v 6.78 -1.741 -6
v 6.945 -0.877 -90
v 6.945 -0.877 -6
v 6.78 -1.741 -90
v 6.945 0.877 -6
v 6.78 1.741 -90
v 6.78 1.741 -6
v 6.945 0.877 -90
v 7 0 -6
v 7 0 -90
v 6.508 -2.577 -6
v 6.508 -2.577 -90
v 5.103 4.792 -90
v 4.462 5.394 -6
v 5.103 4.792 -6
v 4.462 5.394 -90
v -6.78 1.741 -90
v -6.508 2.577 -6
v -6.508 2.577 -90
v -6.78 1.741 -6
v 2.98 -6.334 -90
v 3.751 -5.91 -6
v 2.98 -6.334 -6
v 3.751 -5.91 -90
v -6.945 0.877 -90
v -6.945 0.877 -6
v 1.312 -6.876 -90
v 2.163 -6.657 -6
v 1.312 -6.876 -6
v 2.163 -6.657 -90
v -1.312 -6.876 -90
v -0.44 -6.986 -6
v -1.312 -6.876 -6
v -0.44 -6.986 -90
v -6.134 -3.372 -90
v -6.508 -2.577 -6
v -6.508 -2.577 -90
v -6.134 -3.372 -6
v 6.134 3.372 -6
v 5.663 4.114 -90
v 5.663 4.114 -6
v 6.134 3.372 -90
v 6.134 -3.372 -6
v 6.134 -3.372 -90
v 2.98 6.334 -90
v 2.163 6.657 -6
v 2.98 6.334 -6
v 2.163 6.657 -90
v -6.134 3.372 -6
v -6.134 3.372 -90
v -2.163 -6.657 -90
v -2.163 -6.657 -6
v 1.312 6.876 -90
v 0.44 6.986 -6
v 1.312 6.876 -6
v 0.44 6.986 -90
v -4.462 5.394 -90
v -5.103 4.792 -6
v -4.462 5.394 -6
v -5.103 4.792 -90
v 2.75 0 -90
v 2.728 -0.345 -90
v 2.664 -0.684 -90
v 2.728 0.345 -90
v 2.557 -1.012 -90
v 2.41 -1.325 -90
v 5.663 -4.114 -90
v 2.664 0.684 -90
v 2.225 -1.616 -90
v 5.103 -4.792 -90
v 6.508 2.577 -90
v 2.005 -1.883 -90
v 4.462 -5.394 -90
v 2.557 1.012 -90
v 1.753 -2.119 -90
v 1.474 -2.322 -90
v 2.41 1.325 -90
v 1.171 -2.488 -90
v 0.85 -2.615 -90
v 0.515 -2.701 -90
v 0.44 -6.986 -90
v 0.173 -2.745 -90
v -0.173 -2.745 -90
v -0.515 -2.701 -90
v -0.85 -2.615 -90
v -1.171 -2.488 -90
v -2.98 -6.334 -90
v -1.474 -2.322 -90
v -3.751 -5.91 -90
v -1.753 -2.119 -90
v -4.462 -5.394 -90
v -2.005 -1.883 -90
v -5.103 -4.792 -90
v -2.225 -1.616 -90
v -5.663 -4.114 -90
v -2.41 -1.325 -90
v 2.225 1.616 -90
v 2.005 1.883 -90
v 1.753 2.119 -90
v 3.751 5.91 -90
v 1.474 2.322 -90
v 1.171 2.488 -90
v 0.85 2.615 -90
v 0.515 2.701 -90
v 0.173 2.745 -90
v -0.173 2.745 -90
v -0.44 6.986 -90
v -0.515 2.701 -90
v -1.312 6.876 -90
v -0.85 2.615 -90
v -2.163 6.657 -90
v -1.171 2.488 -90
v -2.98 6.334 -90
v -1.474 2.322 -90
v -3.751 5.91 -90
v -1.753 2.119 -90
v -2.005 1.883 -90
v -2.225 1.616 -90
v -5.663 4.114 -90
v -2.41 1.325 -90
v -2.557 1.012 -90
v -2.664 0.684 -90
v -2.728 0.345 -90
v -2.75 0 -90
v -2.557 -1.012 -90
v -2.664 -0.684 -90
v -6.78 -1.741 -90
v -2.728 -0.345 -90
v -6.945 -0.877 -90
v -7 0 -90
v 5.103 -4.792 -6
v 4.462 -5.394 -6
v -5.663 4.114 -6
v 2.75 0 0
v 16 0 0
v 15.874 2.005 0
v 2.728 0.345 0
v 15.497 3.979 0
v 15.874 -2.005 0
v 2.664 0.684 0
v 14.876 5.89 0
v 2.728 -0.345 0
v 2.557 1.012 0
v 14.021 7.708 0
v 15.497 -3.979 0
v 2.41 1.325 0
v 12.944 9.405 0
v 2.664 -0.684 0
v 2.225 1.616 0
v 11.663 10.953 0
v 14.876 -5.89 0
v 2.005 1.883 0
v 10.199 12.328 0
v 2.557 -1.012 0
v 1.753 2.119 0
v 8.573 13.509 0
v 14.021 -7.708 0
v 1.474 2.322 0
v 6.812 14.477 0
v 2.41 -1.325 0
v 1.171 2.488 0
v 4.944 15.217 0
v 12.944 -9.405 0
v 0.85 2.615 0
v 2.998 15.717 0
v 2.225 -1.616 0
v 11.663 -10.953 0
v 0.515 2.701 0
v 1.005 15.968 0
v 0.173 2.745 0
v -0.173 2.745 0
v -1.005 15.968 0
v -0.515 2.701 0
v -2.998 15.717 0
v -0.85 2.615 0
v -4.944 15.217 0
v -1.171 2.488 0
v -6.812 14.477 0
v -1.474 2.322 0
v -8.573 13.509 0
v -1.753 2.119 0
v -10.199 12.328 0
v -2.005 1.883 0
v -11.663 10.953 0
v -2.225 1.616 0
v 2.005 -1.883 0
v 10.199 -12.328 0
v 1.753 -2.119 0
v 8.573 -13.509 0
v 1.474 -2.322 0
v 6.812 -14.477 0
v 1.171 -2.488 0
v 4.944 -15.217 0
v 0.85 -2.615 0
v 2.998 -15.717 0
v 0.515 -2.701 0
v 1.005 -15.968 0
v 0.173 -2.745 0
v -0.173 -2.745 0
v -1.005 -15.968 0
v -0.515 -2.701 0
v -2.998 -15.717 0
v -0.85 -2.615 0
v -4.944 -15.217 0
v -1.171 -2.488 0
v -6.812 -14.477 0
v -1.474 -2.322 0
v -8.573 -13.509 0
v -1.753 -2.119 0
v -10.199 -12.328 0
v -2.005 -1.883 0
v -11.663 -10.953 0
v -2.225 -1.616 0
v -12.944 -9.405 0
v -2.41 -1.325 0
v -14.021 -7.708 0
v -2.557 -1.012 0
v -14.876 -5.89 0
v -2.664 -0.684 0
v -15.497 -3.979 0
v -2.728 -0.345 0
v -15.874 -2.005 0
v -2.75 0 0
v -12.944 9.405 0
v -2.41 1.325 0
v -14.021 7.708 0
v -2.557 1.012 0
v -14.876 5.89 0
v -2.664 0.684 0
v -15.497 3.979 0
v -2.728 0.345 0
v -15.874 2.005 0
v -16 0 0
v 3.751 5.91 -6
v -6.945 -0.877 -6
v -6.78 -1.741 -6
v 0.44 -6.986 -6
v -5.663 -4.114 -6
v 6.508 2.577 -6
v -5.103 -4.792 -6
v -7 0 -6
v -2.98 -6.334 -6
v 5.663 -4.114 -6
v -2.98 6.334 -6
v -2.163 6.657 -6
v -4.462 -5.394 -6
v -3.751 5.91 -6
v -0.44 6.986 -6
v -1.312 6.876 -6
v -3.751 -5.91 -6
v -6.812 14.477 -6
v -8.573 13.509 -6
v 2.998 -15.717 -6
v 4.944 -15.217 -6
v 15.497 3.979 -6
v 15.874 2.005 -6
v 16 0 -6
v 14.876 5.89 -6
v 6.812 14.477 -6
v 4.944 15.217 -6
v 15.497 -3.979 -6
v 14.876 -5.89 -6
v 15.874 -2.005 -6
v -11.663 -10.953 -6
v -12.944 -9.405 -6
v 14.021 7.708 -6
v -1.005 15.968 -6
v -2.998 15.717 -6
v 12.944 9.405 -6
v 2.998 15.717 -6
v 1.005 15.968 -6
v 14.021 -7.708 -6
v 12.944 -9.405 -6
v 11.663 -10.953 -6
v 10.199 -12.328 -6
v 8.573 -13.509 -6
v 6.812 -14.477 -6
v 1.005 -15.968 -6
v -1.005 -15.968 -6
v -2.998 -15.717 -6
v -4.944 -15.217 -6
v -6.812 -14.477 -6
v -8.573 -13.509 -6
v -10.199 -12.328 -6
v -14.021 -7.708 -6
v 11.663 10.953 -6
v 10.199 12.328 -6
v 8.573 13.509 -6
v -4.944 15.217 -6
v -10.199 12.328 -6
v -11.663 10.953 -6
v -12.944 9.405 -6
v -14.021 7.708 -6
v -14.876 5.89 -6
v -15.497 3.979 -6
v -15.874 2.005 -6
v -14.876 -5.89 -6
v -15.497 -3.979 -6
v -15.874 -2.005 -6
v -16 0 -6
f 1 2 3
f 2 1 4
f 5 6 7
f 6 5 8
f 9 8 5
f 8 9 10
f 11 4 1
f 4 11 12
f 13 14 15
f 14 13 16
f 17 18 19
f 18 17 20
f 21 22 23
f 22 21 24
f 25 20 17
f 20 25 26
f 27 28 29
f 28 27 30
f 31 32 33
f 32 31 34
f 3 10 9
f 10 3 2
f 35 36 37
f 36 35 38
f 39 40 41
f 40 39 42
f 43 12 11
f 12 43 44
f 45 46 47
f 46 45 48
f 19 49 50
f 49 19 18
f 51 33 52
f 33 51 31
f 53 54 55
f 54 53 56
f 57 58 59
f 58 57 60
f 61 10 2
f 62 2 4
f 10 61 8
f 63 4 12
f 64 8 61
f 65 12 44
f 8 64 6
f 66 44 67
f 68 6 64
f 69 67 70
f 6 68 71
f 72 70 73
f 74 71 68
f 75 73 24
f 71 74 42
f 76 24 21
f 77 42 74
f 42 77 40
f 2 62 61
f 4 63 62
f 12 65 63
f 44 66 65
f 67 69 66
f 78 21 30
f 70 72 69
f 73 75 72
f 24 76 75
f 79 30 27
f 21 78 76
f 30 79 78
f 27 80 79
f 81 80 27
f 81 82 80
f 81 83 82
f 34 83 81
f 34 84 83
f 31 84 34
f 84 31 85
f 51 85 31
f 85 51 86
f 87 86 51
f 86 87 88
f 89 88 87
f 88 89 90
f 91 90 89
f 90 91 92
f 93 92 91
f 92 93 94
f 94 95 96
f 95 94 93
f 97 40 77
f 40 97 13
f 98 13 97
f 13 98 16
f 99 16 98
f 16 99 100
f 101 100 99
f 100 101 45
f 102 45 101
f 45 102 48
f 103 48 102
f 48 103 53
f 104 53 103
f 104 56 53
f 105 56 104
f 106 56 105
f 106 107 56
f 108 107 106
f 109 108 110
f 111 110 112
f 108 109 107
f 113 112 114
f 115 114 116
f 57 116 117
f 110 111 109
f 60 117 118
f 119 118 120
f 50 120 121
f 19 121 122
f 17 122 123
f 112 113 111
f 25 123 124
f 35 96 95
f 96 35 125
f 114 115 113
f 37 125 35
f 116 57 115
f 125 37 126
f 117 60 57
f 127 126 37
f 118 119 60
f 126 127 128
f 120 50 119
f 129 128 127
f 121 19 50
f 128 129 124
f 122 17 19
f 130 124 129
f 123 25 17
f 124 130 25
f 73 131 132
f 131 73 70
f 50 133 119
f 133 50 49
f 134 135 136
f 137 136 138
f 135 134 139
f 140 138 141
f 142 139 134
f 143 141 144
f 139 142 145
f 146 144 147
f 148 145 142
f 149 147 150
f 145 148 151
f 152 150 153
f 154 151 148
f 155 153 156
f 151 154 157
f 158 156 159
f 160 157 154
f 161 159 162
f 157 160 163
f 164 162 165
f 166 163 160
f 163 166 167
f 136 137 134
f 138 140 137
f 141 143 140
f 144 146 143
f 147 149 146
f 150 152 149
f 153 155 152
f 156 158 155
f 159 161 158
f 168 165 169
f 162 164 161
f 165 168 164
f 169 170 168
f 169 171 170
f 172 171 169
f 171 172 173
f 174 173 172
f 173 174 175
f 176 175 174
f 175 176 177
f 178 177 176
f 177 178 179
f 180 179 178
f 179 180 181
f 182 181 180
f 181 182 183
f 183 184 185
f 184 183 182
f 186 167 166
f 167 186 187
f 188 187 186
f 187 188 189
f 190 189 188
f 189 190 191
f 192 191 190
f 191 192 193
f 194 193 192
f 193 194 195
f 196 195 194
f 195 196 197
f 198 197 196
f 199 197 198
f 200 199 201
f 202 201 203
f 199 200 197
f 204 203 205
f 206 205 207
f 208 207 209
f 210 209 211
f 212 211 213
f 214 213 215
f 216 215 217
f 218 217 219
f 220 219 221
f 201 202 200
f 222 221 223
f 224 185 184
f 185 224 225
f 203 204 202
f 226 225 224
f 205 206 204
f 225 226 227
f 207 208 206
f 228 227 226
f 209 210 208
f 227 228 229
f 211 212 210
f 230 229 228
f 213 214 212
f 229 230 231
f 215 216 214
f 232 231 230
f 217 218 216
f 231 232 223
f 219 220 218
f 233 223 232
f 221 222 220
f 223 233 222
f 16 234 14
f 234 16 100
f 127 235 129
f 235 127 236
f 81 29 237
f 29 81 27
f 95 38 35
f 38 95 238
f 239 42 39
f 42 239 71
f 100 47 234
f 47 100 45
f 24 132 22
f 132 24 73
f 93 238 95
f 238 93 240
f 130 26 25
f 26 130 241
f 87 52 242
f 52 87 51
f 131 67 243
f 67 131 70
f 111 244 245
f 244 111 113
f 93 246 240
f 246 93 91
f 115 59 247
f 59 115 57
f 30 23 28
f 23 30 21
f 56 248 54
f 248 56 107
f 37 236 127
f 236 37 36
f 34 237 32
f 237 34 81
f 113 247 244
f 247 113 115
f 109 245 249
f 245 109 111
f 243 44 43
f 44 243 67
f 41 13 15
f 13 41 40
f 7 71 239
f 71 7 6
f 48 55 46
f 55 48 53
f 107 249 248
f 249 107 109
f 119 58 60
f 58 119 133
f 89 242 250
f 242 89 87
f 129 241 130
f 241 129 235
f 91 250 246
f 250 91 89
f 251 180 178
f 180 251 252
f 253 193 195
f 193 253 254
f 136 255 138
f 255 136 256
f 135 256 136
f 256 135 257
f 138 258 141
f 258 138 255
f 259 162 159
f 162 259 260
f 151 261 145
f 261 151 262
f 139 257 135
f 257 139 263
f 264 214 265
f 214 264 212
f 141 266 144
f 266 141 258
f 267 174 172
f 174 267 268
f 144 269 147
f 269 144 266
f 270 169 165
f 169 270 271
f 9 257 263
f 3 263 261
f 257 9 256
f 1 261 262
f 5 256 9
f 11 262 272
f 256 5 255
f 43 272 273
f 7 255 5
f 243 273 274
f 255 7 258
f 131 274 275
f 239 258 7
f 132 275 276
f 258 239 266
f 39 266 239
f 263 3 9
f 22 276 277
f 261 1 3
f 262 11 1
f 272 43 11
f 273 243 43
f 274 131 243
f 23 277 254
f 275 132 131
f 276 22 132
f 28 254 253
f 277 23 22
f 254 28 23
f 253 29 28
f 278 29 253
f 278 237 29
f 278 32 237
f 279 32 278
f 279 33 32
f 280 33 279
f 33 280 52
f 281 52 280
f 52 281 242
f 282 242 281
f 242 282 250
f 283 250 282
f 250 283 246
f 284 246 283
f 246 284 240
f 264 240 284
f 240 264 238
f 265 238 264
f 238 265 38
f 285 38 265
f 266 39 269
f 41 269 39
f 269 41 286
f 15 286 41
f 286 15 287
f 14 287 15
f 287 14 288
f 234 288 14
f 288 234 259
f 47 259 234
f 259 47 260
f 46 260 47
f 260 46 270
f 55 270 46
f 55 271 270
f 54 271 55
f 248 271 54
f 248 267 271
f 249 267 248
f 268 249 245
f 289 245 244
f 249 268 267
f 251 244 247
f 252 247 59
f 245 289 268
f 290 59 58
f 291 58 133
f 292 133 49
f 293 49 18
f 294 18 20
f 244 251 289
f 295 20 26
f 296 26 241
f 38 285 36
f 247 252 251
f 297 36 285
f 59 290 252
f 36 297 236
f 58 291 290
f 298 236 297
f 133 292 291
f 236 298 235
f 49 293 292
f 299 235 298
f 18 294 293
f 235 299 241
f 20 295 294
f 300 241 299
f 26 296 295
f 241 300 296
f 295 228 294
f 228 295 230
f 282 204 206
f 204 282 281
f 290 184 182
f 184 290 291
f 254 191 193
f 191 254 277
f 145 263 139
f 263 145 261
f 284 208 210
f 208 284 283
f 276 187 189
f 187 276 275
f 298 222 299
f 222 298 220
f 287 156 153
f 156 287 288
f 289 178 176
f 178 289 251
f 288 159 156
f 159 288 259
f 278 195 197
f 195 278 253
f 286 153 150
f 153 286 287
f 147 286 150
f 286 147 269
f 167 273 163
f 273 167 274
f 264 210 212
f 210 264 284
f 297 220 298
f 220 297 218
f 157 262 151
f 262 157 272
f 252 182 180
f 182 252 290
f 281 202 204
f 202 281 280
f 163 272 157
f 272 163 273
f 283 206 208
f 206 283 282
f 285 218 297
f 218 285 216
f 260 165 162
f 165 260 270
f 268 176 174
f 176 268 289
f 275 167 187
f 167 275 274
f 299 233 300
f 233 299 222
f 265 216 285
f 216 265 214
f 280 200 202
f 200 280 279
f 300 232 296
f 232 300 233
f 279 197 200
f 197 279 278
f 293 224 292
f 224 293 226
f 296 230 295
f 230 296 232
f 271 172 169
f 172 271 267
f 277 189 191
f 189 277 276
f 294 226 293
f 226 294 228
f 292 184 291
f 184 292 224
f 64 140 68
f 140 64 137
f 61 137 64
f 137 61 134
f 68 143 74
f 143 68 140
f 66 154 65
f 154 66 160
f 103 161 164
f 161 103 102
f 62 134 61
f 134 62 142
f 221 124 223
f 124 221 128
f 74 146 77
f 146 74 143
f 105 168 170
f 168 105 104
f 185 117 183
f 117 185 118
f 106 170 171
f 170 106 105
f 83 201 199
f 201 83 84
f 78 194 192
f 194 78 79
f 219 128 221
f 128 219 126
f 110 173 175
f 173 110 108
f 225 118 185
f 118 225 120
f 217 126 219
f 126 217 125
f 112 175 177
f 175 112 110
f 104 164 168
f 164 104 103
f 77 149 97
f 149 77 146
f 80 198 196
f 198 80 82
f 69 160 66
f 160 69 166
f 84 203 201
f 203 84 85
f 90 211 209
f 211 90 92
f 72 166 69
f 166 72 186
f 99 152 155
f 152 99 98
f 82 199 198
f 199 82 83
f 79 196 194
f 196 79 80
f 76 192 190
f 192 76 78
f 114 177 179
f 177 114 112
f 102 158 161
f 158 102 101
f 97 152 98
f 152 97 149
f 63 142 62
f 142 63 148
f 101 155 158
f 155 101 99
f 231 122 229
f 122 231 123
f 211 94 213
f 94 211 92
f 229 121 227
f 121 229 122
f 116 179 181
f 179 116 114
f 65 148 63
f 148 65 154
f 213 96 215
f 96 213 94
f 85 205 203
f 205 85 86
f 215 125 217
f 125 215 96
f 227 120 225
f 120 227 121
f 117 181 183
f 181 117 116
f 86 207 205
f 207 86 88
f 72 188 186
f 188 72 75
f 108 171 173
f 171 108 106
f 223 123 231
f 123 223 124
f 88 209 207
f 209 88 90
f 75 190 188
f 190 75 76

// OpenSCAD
$fn = 50;


difference() {
	union() {
		translate(v = [0, 0, -90.0000000000]) {
			cylinder(h = 90, r = 7.0000000000);
		}
		translate(v = [0, 0, -6.0000000000]) {
			cylinder(h = 6, r = 16.0000000000);
		}
	}
	union() {
		#translate(v = [0, 0, -90]) {
			cylinder(h = 90, r = 2.7500000000);
		}
	}
}
